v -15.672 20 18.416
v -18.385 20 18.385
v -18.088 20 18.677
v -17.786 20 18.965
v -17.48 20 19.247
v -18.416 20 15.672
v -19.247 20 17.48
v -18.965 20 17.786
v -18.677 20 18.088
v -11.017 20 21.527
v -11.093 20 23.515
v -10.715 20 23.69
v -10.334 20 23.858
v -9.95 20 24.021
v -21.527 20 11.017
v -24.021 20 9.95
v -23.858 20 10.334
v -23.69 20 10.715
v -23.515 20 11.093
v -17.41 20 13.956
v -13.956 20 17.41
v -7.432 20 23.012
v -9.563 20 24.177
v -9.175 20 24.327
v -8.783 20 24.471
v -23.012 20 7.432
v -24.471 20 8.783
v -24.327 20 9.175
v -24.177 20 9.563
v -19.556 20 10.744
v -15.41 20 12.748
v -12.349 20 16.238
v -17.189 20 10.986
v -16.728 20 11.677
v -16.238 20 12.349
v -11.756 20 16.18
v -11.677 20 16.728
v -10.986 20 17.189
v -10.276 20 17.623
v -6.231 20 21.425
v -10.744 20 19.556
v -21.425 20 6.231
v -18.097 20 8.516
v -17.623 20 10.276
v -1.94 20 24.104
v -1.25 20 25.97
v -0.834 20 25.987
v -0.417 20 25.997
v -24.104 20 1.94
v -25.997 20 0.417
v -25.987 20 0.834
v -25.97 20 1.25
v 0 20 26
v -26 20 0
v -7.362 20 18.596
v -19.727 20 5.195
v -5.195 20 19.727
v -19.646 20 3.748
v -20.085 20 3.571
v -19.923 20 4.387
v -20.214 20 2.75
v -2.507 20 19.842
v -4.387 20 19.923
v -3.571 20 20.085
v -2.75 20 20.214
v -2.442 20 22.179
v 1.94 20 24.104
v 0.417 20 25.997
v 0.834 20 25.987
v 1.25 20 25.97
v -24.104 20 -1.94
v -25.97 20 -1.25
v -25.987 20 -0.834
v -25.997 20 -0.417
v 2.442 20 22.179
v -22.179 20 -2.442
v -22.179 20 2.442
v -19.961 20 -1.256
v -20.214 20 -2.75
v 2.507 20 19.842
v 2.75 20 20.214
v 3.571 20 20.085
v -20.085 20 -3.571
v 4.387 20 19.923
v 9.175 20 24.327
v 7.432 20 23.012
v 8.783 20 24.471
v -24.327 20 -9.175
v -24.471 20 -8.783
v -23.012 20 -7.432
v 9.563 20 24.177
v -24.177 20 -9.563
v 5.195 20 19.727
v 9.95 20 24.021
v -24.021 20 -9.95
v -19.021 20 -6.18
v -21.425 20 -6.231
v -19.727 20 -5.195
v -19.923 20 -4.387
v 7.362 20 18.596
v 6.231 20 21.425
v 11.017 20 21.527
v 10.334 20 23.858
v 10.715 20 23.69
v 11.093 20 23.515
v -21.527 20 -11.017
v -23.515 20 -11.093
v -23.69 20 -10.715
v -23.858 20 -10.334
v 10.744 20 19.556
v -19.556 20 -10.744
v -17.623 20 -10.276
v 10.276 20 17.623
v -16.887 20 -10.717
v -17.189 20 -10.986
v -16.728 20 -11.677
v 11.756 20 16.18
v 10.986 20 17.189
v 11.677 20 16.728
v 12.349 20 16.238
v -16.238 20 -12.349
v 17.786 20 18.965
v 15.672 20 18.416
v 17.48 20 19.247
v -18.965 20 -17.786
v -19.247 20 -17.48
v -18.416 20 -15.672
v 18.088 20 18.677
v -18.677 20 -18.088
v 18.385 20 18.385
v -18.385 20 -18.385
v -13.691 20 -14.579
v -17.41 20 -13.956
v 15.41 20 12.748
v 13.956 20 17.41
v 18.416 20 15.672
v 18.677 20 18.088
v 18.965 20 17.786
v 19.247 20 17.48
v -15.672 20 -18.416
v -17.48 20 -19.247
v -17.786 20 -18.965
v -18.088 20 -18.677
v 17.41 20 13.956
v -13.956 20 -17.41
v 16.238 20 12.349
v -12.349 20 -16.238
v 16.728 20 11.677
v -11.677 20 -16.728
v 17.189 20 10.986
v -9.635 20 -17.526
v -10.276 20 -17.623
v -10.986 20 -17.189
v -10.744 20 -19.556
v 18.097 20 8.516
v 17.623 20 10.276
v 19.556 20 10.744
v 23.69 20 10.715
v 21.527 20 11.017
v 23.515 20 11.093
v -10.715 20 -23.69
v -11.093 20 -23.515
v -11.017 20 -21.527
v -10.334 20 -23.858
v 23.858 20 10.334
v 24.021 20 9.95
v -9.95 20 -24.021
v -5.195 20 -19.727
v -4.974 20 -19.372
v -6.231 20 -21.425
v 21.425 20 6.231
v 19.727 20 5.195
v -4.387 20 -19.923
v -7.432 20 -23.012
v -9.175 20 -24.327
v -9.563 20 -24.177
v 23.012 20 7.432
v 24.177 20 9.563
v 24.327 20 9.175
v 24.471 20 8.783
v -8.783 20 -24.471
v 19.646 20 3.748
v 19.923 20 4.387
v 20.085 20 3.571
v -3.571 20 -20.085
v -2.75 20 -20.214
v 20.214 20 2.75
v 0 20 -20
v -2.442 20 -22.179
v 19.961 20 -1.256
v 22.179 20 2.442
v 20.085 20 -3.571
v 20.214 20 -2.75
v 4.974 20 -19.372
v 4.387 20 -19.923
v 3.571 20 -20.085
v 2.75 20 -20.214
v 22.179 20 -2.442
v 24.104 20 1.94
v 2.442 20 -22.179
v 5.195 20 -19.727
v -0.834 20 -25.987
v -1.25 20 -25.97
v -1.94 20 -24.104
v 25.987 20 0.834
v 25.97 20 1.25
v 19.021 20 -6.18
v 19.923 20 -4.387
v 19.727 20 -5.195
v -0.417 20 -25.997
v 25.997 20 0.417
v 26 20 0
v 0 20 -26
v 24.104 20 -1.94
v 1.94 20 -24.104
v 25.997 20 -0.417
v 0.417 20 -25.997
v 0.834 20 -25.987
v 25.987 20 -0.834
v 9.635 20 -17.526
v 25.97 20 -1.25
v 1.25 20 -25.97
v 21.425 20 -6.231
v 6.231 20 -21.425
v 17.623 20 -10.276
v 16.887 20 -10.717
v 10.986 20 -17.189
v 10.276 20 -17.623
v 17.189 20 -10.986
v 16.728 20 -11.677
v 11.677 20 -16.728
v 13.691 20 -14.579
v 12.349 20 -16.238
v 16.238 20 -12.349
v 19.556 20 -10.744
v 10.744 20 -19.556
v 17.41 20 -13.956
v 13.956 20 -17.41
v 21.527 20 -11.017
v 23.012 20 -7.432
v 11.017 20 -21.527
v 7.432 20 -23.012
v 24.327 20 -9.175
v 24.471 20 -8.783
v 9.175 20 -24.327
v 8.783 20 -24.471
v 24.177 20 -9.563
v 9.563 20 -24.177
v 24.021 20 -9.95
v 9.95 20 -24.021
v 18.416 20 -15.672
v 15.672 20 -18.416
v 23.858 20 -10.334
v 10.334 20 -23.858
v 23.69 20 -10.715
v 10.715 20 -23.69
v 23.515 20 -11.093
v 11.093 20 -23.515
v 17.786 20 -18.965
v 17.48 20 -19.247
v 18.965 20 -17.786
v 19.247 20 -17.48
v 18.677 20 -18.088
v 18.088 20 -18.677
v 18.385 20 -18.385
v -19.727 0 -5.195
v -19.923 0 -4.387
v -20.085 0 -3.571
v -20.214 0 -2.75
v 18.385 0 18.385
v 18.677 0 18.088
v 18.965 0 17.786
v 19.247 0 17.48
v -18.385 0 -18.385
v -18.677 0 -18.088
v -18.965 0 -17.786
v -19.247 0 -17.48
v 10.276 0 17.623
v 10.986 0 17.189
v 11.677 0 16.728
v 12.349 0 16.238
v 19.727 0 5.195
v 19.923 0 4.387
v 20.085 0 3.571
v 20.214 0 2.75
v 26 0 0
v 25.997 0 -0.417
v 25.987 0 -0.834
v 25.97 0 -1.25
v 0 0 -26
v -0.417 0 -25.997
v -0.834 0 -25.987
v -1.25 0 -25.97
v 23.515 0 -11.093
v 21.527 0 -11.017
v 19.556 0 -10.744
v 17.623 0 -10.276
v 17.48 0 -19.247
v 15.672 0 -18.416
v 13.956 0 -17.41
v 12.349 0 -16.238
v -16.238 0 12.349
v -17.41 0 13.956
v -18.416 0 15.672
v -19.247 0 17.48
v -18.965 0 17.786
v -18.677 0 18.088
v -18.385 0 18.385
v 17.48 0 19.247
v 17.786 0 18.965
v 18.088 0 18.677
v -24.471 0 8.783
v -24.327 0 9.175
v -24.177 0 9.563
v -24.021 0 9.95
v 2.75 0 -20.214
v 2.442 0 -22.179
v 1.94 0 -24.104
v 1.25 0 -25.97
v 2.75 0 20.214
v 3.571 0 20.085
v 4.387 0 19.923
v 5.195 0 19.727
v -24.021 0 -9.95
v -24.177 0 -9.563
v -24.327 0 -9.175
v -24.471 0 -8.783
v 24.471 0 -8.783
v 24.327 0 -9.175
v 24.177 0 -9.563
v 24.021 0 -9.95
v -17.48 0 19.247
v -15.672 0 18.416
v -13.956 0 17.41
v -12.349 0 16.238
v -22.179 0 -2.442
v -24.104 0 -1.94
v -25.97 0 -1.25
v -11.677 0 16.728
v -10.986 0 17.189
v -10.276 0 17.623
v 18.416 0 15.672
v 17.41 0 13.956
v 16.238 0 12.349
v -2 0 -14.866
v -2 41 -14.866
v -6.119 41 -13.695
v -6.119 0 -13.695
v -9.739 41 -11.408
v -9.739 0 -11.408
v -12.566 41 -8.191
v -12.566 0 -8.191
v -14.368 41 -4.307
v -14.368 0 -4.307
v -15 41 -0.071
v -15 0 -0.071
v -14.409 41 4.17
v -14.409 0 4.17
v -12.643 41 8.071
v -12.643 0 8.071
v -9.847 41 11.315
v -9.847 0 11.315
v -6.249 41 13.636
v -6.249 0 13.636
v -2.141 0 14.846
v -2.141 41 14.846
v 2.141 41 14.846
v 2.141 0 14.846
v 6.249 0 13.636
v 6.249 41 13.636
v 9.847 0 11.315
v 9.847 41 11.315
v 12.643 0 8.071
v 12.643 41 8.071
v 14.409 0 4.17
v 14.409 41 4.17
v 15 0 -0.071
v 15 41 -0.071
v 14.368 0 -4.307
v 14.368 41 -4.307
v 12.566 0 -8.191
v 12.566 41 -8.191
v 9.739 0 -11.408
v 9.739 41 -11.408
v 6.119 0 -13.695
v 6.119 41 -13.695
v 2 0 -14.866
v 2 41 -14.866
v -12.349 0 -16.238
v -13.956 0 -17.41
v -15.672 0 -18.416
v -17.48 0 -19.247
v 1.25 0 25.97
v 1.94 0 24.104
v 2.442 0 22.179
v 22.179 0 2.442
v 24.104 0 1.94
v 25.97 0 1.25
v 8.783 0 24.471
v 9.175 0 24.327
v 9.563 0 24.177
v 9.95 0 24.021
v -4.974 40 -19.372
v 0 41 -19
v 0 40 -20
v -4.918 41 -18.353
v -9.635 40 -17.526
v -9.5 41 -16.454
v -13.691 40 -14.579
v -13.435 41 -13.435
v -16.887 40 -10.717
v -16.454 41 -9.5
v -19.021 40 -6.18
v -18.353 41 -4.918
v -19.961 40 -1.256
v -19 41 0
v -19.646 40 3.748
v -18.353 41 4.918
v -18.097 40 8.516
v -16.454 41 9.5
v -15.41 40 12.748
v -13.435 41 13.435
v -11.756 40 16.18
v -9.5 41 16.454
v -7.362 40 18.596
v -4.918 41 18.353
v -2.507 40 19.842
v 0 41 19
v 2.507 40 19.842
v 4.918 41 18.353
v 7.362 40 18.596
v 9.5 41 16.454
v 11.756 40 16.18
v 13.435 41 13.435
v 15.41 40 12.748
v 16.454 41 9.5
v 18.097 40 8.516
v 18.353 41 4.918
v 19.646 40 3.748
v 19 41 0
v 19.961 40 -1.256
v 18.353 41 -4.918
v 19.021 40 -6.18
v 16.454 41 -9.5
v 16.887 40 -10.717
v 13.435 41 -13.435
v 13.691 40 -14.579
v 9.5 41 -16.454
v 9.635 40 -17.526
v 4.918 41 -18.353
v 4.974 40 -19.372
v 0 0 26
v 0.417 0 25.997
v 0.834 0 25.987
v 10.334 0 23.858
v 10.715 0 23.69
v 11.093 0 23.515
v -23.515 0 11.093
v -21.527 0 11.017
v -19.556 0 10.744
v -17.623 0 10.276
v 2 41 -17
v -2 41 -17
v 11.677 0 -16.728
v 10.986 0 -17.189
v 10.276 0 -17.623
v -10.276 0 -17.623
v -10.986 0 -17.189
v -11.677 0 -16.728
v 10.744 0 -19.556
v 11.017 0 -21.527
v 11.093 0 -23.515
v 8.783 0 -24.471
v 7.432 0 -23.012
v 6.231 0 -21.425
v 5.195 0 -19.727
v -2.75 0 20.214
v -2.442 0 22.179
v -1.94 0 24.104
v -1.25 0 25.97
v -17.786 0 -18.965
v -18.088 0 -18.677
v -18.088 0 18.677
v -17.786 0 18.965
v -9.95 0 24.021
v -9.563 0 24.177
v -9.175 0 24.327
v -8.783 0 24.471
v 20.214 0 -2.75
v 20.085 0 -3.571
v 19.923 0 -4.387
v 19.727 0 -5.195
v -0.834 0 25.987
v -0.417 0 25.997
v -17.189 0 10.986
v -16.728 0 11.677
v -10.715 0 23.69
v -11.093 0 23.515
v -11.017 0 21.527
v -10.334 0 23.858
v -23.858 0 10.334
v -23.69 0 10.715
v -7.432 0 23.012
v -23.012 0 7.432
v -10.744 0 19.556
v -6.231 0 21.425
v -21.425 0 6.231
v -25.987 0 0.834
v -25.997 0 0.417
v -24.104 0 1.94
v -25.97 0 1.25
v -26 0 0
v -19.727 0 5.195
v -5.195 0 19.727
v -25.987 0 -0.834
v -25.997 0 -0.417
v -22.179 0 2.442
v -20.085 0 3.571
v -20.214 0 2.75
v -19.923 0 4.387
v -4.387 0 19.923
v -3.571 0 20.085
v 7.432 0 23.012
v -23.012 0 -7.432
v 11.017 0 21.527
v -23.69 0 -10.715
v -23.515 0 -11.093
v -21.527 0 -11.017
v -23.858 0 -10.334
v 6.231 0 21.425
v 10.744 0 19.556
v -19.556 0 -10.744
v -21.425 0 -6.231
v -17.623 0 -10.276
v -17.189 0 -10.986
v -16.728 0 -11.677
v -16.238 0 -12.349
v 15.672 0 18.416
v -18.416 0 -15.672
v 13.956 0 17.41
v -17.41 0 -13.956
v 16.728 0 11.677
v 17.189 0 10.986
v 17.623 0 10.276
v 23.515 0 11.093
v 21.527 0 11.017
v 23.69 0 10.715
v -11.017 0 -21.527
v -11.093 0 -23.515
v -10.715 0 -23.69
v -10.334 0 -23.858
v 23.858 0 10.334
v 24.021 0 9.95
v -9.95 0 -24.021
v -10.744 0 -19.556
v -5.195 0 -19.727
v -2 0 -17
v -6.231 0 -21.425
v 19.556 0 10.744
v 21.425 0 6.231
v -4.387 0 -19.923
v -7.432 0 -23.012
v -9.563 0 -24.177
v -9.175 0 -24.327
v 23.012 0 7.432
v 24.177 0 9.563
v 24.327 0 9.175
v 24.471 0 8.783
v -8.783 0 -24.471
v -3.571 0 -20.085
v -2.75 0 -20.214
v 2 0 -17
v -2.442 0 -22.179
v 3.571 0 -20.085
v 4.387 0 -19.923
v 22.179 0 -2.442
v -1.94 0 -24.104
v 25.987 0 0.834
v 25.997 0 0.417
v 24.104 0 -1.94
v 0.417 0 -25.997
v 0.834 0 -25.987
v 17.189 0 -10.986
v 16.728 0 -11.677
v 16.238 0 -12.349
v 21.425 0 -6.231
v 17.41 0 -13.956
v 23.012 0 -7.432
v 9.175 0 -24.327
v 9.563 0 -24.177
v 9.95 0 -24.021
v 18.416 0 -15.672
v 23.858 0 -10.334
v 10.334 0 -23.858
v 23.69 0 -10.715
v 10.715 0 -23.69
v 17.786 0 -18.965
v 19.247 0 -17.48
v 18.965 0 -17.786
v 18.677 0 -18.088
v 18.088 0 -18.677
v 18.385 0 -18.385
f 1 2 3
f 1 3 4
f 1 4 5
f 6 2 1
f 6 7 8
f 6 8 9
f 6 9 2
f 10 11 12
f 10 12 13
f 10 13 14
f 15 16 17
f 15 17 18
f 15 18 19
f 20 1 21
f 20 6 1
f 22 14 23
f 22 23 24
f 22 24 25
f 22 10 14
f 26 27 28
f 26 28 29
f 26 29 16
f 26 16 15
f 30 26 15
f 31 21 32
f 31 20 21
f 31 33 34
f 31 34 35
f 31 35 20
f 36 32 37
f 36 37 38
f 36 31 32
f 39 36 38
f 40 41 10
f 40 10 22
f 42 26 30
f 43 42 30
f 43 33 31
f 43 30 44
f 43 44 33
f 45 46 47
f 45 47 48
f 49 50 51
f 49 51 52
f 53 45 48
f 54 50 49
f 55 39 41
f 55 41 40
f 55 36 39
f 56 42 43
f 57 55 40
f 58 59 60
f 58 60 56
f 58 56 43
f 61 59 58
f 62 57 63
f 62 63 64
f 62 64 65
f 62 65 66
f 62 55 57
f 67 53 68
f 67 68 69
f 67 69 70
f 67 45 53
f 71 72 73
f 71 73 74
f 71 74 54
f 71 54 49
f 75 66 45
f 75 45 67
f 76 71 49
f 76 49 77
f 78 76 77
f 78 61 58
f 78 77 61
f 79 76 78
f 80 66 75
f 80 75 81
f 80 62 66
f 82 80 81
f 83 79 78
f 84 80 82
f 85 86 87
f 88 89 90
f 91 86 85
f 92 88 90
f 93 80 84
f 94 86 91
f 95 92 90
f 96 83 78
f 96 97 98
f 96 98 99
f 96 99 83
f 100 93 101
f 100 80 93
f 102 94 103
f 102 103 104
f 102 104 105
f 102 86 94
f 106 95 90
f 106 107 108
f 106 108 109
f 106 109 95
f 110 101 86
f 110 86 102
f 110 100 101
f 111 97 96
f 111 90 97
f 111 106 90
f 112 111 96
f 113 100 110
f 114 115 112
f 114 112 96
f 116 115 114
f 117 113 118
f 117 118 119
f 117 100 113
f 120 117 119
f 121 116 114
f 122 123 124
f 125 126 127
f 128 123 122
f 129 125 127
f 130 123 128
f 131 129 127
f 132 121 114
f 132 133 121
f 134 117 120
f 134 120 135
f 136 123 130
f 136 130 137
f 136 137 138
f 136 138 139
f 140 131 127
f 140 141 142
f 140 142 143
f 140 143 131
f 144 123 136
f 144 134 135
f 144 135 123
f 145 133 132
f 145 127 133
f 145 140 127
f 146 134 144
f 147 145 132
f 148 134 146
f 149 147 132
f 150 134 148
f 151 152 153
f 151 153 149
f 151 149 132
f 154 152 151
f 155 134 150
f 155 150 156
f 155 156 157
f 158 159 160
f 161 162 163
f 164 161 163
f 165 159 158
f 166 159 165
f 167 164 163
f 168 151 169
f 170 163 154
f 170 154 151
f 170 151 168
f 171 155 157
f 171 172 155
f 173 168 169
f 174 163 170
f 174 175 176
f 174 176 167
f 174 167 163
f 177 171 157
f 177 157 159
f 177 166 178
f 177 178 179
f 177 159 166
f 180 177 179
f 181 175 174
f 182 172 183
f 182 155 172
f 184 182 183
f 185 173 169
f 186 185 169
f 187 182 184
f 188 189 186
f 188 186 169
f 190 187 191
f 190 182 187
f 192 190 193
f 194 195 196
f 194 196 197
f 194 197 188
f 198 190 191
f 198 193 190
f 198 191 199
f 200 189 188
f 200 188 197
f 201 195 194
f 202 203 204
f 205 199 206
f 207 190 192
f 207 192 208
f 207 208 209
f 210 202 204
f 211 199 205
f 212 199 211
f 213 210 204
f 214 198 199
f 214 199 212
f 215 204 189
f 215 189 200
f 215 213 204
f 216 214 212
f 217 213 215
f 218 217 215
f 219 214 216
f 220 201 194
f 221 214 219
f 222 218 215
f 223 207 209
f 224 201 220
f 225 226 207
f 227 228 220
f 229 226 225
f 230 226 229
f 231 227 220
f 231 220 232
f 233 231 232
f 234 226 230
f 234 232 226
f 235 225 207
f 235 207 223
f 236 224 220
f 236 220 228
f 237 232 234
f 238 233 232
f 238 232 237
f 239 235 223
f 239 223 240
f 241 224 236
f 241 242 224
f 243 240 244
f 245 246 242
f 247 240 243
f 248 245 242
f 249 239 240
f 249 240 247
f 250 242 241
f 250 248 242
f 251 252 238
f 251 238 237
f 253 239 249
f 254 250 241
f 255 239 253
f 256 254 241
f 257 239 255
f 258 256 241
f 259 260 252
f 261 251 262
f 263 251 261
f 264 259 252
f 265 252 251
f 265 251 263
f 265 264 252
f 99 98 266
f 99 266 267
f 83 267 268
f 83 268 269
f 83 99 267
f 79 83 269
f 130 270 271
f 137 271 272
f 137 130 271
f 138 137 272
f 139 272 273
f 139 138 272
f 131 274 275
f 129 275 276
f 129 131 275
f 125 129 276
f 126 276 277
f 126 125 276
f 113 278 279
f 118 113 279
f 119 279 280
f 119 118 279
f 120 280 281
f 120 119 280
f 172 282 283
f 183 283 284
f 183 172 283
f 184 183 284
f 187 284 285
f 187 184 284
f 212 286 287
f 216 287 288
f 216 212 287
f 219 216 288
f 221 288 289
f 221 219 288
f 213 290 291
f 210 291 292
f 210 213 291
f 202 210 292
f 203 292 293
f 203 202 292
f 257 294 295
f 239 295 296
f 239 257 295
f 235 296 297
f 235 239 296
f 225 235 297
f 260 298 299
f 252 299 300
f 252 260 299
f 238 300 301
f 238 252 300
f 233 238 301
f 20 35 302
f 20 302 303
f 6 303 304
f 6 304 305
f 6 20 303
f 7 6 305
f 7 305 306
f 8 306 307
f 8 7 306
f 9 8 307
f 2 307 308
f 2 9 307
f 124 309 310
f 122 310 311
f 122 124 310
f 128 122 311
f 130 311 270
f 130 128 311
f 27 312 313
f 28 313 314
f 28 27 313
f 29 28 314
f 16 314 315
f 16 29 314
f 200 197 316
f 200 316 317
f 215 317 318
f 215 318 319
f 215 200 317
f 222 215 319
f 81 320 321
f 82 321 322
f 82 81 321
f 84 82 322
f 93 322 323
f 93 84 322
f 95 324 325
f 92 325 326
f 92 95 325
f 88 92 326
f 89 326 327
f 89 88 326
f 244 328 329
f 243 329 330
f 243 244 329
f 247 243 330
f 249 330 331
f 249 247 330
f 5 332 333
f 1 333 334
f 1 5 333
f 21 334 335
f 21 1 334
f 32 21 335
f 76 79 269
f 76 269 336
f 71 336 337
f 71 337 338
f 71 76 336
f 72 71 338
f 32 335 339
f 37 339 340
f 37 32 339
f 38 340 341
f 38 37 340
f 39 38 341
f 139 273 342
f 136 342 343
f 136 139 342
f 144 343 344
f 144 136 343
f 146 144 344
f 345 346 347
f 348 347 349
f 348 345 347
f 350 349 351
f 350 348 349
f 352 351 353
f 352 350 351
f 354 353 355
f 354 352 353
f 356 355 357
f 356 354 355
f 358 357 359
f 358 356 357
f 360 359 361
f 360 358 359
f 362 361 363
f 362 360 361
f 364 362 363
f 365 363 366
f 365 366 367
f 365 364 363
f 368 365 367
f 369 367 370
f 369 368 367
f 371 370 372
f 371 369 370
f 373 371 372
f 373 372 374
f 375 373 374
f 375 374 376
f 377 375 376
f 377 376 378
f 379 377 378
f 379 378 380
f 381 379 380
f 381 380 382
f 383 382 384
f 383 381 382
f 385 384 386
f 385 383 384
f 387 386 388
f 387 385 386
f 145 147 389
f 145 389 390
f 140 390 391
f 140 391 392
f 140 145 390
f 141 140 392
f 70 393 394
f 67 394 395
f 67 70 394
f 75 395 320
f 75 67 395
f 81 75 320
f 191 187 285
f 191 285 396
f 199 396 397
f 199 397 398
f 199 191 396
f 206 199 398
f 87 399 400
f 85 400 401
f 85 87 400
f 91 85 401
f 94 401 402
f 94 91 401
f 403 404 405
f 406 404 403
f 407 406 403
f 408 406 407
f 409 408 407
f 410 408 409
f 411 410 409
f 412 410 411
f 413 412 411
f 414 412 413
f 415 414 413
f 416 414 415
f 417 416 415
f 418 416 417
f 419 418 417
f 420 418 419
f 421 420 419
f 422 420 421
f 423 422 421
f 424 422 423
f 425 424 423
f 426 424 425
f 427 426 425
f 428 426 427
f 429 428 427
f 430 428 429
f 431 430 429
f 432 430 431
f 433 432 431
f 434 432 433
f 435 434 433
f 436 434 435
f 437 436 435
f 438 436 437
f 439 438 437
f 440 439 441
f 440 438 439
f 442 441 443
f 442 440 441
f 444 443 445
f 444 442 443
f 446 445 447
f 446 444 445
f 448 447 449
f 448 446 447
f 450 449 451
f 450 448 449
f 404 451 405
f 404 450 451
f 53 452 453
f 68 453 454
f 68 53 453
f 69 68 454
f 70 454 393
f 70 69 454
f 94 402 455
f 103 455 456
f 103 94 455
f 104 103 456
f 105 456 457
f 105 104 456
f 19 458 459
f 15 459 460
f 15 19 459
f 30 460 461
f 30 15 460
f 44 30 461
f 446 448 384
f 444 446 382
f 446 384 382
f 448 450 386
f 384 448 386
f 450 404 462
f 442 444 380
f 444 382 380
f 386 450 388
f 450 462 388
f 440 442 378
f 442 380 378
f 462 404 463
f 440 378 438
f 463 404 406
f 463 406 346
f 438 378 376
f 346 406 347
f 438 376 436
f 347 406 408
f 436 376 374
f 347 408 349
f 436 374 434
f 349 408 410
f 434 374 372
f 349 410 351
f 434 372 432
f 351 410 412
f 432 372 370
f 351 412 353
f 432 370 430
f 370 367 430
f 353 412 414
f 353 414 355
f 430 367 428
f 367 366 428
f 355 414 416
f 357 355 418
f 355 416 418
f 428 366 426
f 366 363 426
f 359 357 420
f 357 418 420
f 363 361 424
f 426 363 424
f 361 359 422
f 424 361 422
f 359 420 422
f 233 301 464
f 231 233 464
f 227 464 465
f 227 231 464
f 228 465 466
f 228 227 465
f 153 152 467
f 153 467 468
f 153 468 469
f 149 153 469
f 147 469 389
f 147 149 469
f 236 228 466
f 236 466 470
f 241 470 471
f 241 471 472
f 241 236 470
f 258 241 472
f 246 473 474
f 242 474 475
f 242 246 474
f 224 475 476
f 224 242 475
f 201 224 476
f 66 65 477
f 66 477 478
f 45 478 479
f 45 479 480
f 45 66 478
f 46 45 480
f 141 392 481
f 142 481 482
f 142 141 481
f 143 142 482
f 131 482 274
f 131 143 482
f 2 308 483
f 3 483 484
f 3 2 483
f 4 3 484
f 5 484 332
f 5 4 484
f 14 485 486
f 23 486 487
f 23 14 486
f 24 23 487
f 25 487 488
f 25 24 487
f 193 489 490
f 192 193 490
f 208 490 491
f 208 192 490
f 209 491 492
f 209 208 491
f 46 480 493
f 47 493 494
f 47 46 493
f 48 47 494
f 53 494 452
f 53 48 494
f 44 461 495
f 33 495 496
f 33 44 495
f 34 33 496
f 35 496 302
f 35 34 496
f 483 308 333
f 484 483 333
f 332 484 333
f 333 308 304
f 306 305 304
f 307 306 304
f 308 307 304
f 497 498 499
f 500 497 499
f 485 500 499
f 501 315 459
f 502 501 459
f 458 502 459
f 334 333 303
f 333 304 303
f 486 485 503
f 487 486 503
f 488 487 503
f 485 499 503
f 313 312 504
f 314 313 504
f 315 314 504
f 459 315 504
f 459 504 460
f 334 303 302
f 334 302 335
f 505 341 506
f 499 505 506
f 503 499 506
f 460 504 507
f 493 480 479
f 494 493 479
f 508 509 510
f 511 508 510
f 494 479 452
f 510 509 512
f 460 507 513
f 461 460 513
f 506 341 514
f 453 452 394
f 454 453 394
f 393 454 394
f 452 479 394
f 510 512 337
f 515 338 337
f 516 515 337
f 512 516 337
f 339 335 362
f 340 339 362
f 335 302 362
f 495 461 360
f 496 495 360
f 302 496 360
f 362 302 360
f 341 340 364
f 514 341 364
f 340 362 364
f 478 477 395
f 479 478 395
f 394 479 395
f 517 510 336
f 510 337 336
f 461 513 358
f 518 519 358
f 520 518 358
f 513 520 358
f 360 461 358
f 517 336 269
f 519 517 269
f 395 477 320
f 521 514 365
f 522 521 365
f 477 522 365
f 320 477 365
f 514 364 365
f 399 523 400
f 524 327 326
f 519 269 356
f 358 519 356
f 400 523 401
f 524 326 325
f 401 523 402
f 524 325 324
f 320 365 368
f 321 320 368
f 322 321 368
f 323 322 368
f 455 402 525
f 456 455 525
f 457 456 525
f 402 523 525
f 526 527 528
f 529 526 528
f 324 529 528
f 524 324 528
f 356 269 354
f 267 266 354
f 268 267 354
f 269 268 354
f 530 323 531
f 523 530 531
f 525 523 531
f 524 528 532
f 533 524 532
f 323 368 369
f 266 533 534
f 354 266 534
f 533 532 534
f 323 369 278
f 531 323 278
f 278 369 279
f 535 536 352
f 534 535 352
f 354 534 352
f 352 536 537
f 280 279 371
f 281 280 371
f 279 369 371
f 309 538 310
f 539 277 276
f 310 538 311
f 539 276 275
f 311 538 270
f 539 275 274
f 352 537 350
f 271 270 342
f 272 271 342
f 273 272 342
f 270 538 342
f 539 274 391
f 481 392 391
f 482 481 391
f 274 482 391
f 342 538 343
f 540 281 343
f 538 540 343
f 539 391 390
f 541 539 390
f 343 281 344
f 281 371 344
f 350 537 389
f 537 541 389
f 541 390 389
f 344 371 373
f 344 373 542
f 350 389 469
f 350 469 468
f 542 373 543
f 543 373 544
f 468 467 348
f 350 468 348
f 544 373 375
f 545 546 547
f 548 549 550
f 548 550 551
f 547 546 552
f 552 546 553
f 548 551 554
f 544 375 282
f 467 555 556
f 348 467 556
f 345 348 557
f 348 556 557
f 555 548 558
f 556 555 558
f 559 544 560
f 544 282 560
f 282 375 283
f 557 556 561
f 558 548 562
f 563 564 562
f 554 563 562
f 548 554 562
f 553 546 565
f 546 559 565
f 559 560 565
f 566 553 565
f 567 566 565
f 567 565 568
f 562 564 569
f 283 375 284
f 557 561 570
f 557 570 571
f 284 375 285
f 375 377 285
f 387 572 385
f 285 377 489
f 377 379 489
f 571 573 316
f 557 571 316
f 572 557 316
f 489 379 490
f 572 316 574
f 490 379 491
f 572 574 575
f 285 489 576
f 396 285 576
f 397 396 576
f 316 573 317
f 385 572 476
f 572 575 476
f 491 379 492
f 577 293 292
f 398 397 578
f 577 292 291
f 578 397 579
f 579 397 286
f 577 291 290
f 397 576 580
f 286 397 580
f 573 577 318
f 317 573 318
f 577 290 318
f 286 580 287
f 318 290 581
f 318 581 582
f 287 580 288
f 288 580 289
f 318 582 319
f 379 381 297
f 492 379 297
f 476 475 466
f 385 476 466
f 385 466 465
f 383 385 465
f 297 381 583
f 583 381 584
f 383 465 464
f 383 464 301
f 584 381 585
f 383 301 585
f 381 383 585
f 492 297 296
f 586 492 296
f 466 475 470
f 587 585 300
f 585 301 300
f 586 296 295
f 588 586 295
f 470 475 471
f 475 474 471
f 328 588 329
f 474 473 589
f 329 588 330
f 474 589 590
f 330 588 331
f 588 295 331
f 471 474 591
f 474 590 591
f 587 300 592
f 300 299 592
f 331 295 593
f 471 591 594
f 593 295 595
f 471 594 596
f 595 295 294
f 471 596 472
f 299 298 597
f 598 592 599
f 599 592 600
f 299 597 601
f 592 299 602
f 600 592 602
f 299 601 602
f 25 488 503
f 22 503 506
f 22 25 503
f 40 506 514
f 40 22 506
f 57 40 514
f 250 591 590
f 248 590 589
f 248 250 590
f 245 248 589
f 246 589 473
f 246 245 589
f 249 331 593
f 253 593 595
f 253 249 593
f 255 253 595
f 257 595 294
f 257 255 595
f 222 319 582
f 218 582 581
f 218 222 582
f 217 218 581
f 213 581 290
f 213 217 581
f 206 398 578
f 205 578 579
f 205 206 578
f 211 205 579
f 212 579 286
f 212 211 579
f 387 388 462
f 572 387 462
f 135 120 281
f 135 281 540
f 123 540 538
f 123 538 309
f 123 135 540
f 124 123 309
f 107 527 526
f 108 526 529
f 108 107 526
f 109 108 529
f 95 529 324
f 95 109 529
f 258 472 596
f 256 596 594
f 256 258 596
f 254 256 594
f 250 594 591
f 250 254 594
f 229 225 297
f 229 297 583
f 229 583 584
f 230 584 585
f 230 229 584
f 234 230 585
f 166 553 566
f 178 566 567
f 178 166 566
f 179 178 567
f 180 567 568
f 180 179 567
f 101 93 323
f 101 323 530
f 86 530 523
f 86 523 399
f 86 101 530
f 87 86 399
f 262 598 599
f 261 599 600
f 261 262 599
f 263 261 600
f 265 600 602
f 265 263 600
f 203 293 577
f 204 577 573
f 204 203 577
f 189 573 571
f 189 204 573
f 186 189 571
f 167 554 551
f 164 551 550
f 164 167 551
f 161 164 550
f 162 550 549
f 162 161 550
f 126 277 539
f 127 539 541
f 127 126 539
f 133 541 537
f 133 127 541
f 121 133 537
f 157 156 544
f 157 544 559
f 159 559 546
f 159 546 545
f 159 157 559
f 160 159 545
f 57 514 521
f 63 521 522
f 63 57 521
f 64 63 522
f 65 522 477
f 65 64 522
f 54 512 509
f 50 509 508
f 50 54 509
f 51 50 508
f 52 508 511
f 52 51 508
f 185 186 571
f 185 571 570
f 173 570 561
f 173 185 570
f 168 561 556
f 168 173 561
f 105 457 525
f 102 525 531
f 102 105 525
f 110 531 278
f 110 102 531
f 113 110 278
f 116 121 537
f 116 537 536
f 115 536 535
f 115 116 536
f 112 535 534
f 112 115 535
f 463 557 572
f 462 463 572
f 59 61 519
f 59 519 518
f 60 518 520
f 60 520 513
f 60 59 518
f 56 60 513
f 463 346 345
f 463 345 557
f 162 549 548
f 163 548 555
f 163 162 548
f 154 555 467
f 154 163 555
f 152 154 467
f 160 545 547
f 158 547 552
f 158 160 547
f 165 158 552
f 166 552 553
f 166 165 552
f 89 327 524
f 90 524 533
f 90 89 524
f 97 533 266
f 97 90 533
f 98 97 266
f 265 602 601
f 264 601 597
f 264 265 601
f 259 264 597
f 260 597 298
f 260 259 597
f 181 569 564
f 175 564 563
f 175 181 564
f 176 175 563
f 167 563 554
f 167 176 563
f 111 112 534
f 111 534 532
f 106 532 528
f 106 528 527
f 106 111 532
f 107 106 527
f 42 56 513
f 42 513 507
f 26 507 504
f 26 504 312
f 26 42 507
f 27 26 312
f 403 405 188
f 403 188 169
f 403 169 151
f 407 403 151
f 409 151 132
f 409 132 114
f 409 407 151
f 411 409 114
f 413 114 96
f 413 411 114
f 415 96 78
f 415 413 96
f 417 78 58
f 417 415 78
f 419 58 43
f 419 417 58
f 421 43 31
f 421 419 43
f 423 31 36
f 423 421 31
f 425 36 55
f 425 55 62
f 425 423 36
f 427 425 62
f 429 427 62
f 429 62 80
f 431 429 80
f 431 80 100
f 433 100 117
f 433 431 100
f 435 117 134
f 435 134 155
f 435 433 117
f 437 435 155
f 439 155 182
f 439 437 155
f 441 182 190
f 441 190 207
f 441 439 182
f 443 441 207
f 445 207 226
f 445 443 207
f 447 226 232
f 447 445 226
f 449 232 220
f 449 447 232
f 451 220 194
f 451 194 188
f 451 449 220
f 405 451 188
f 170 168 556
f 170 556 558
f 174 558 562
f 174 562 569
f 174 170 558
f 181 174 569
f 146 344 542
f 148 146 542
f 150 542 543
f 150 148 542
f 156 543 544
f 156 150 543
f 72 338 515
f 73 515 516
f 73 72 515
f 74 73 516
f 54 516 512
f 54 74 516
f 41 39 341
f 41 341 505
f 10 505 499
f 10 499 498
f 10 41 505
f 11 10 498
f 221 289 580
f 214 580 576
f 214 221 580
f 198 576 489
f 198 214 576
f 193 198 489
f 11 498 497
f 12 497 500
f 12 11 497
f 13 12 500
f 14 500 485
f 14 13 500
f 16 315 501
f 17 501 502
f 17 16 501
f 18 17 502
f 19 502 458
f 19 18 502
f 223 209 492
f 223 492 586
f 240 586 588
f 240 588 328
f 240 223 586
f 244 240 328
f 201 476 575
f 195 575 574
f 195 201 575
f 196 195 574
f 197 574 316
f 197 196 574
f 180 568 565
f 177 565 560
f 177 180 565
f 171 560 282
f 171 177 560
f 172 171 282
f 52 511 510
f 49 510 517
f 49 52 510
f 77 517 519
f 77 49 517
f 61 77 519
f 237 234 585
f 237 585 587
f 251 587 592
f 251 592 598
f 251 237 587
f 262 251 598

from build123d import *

# Parameters (mm, degrees)
SKETCH2_W           = 5
SKETCH2_H           = 21
SKETCH2_W_2         = 5.4
SKETCH2_H_2         = 20
BOSS_EXTRUDE1_DEPTH = 20
CIRPATTERN1_COUNT   = 16
SKETCH6_W           = 4
SKETCH6_H           = 4
CUT_EXTRUDE1_DEPTH  = 56.072679252
CHAMFER1_SIZE       = 1


with BuildPart() as part:
    # Sketch2 → Revolve1 (revolve)
    with BuildSketch(Plane.XY, mode=Mode.PRIVATE) as revolve1_sk:
        with Locations((17.5, 30.5)):
            Rectangle(SKETCH2_W, SKETCH2_H)
        with Locations((17.7, 10)):
            Rectangle(SKETCH2_W_2, SKETCH2_H_2)
    revolve(revolve1_sk.sketch.rotate(Axis((0, 0, 0), (0, 1, 0)), 90), axis=Axis((0, 0, 0), (0, 1, 0)))

    # Sketch4 → Boss-Extrude1 (add)
    with BuildSketch(Plane(origin=(0, 20, 0), x_dir=(1, 0, 0), z_dir=(0, 1, 0))):
        with BuildLine():
            ThreePointArc((-2.75, 20.213794795), (-1.37814843, 20.353395464), (0, 20.4))
            Line((0, 20.4), (0, 26))
            ThreePointArc((0, 26), (-0.62518076, 25.992482548), (-1.25, 25.96993454))
            ThreePointArc((-1.25, 25.96993454), (-2.215194302, 23.147942432), (-2.75, 20.213794795))
        make_face()
        with BuildLine():
            Line((0, 26), (0, 20.4))
            ThreePointArc((0, 20.4), (1.37814843, 20.353395464), (2.75, 20.213794795))
            ThreePointArc((2.75, 20.213794795), (2.215194302, 23.147942432), (1.25, 25.96993454))
            ThreePointArc((1.25, 25.96993454), (0.62518076, 25.992482548), (0, 26))
        make_face()
    boss_extrude1 = extrude(amount=-BOSS_EXTRUDE1_DEPTH)

    # CirPattern1: Boss-Extrude1 ×16 about axis
    cirpattern1_axis = Axis((0, 0, 0), (0, 1, 0))
    for i in range(1, CIRPATTERN1_COUNT):
        add(boss_extrude1.rotate(cirpattern1_axis, i * 360 / CIRPATTERN1_COUNT))

    # Sketch6 → Cut-Extrude1 (cut, through all)
    with BuildSketch(Plane(origin=(0, 41, 0), x_dir=(1, 0, 0), z_dir=(0, 1, 0))):
        with Locations((0, 15)):
            Rectangle(SKETCH6_W, SKETCH6_H)
    extrude(amount=-CUT_EXTRUDE1_DEPTH, mode=Mode.SUBTRACT)

    # Chamfer1
    chamfer1_edges = [part.edges().sort_by_distance(p)[0] for p in [
        (0, 41, 20),
    ]]
    chamfer(chamfer1_edges, length=CHAMFER1_SIZE)


solid = part.part
